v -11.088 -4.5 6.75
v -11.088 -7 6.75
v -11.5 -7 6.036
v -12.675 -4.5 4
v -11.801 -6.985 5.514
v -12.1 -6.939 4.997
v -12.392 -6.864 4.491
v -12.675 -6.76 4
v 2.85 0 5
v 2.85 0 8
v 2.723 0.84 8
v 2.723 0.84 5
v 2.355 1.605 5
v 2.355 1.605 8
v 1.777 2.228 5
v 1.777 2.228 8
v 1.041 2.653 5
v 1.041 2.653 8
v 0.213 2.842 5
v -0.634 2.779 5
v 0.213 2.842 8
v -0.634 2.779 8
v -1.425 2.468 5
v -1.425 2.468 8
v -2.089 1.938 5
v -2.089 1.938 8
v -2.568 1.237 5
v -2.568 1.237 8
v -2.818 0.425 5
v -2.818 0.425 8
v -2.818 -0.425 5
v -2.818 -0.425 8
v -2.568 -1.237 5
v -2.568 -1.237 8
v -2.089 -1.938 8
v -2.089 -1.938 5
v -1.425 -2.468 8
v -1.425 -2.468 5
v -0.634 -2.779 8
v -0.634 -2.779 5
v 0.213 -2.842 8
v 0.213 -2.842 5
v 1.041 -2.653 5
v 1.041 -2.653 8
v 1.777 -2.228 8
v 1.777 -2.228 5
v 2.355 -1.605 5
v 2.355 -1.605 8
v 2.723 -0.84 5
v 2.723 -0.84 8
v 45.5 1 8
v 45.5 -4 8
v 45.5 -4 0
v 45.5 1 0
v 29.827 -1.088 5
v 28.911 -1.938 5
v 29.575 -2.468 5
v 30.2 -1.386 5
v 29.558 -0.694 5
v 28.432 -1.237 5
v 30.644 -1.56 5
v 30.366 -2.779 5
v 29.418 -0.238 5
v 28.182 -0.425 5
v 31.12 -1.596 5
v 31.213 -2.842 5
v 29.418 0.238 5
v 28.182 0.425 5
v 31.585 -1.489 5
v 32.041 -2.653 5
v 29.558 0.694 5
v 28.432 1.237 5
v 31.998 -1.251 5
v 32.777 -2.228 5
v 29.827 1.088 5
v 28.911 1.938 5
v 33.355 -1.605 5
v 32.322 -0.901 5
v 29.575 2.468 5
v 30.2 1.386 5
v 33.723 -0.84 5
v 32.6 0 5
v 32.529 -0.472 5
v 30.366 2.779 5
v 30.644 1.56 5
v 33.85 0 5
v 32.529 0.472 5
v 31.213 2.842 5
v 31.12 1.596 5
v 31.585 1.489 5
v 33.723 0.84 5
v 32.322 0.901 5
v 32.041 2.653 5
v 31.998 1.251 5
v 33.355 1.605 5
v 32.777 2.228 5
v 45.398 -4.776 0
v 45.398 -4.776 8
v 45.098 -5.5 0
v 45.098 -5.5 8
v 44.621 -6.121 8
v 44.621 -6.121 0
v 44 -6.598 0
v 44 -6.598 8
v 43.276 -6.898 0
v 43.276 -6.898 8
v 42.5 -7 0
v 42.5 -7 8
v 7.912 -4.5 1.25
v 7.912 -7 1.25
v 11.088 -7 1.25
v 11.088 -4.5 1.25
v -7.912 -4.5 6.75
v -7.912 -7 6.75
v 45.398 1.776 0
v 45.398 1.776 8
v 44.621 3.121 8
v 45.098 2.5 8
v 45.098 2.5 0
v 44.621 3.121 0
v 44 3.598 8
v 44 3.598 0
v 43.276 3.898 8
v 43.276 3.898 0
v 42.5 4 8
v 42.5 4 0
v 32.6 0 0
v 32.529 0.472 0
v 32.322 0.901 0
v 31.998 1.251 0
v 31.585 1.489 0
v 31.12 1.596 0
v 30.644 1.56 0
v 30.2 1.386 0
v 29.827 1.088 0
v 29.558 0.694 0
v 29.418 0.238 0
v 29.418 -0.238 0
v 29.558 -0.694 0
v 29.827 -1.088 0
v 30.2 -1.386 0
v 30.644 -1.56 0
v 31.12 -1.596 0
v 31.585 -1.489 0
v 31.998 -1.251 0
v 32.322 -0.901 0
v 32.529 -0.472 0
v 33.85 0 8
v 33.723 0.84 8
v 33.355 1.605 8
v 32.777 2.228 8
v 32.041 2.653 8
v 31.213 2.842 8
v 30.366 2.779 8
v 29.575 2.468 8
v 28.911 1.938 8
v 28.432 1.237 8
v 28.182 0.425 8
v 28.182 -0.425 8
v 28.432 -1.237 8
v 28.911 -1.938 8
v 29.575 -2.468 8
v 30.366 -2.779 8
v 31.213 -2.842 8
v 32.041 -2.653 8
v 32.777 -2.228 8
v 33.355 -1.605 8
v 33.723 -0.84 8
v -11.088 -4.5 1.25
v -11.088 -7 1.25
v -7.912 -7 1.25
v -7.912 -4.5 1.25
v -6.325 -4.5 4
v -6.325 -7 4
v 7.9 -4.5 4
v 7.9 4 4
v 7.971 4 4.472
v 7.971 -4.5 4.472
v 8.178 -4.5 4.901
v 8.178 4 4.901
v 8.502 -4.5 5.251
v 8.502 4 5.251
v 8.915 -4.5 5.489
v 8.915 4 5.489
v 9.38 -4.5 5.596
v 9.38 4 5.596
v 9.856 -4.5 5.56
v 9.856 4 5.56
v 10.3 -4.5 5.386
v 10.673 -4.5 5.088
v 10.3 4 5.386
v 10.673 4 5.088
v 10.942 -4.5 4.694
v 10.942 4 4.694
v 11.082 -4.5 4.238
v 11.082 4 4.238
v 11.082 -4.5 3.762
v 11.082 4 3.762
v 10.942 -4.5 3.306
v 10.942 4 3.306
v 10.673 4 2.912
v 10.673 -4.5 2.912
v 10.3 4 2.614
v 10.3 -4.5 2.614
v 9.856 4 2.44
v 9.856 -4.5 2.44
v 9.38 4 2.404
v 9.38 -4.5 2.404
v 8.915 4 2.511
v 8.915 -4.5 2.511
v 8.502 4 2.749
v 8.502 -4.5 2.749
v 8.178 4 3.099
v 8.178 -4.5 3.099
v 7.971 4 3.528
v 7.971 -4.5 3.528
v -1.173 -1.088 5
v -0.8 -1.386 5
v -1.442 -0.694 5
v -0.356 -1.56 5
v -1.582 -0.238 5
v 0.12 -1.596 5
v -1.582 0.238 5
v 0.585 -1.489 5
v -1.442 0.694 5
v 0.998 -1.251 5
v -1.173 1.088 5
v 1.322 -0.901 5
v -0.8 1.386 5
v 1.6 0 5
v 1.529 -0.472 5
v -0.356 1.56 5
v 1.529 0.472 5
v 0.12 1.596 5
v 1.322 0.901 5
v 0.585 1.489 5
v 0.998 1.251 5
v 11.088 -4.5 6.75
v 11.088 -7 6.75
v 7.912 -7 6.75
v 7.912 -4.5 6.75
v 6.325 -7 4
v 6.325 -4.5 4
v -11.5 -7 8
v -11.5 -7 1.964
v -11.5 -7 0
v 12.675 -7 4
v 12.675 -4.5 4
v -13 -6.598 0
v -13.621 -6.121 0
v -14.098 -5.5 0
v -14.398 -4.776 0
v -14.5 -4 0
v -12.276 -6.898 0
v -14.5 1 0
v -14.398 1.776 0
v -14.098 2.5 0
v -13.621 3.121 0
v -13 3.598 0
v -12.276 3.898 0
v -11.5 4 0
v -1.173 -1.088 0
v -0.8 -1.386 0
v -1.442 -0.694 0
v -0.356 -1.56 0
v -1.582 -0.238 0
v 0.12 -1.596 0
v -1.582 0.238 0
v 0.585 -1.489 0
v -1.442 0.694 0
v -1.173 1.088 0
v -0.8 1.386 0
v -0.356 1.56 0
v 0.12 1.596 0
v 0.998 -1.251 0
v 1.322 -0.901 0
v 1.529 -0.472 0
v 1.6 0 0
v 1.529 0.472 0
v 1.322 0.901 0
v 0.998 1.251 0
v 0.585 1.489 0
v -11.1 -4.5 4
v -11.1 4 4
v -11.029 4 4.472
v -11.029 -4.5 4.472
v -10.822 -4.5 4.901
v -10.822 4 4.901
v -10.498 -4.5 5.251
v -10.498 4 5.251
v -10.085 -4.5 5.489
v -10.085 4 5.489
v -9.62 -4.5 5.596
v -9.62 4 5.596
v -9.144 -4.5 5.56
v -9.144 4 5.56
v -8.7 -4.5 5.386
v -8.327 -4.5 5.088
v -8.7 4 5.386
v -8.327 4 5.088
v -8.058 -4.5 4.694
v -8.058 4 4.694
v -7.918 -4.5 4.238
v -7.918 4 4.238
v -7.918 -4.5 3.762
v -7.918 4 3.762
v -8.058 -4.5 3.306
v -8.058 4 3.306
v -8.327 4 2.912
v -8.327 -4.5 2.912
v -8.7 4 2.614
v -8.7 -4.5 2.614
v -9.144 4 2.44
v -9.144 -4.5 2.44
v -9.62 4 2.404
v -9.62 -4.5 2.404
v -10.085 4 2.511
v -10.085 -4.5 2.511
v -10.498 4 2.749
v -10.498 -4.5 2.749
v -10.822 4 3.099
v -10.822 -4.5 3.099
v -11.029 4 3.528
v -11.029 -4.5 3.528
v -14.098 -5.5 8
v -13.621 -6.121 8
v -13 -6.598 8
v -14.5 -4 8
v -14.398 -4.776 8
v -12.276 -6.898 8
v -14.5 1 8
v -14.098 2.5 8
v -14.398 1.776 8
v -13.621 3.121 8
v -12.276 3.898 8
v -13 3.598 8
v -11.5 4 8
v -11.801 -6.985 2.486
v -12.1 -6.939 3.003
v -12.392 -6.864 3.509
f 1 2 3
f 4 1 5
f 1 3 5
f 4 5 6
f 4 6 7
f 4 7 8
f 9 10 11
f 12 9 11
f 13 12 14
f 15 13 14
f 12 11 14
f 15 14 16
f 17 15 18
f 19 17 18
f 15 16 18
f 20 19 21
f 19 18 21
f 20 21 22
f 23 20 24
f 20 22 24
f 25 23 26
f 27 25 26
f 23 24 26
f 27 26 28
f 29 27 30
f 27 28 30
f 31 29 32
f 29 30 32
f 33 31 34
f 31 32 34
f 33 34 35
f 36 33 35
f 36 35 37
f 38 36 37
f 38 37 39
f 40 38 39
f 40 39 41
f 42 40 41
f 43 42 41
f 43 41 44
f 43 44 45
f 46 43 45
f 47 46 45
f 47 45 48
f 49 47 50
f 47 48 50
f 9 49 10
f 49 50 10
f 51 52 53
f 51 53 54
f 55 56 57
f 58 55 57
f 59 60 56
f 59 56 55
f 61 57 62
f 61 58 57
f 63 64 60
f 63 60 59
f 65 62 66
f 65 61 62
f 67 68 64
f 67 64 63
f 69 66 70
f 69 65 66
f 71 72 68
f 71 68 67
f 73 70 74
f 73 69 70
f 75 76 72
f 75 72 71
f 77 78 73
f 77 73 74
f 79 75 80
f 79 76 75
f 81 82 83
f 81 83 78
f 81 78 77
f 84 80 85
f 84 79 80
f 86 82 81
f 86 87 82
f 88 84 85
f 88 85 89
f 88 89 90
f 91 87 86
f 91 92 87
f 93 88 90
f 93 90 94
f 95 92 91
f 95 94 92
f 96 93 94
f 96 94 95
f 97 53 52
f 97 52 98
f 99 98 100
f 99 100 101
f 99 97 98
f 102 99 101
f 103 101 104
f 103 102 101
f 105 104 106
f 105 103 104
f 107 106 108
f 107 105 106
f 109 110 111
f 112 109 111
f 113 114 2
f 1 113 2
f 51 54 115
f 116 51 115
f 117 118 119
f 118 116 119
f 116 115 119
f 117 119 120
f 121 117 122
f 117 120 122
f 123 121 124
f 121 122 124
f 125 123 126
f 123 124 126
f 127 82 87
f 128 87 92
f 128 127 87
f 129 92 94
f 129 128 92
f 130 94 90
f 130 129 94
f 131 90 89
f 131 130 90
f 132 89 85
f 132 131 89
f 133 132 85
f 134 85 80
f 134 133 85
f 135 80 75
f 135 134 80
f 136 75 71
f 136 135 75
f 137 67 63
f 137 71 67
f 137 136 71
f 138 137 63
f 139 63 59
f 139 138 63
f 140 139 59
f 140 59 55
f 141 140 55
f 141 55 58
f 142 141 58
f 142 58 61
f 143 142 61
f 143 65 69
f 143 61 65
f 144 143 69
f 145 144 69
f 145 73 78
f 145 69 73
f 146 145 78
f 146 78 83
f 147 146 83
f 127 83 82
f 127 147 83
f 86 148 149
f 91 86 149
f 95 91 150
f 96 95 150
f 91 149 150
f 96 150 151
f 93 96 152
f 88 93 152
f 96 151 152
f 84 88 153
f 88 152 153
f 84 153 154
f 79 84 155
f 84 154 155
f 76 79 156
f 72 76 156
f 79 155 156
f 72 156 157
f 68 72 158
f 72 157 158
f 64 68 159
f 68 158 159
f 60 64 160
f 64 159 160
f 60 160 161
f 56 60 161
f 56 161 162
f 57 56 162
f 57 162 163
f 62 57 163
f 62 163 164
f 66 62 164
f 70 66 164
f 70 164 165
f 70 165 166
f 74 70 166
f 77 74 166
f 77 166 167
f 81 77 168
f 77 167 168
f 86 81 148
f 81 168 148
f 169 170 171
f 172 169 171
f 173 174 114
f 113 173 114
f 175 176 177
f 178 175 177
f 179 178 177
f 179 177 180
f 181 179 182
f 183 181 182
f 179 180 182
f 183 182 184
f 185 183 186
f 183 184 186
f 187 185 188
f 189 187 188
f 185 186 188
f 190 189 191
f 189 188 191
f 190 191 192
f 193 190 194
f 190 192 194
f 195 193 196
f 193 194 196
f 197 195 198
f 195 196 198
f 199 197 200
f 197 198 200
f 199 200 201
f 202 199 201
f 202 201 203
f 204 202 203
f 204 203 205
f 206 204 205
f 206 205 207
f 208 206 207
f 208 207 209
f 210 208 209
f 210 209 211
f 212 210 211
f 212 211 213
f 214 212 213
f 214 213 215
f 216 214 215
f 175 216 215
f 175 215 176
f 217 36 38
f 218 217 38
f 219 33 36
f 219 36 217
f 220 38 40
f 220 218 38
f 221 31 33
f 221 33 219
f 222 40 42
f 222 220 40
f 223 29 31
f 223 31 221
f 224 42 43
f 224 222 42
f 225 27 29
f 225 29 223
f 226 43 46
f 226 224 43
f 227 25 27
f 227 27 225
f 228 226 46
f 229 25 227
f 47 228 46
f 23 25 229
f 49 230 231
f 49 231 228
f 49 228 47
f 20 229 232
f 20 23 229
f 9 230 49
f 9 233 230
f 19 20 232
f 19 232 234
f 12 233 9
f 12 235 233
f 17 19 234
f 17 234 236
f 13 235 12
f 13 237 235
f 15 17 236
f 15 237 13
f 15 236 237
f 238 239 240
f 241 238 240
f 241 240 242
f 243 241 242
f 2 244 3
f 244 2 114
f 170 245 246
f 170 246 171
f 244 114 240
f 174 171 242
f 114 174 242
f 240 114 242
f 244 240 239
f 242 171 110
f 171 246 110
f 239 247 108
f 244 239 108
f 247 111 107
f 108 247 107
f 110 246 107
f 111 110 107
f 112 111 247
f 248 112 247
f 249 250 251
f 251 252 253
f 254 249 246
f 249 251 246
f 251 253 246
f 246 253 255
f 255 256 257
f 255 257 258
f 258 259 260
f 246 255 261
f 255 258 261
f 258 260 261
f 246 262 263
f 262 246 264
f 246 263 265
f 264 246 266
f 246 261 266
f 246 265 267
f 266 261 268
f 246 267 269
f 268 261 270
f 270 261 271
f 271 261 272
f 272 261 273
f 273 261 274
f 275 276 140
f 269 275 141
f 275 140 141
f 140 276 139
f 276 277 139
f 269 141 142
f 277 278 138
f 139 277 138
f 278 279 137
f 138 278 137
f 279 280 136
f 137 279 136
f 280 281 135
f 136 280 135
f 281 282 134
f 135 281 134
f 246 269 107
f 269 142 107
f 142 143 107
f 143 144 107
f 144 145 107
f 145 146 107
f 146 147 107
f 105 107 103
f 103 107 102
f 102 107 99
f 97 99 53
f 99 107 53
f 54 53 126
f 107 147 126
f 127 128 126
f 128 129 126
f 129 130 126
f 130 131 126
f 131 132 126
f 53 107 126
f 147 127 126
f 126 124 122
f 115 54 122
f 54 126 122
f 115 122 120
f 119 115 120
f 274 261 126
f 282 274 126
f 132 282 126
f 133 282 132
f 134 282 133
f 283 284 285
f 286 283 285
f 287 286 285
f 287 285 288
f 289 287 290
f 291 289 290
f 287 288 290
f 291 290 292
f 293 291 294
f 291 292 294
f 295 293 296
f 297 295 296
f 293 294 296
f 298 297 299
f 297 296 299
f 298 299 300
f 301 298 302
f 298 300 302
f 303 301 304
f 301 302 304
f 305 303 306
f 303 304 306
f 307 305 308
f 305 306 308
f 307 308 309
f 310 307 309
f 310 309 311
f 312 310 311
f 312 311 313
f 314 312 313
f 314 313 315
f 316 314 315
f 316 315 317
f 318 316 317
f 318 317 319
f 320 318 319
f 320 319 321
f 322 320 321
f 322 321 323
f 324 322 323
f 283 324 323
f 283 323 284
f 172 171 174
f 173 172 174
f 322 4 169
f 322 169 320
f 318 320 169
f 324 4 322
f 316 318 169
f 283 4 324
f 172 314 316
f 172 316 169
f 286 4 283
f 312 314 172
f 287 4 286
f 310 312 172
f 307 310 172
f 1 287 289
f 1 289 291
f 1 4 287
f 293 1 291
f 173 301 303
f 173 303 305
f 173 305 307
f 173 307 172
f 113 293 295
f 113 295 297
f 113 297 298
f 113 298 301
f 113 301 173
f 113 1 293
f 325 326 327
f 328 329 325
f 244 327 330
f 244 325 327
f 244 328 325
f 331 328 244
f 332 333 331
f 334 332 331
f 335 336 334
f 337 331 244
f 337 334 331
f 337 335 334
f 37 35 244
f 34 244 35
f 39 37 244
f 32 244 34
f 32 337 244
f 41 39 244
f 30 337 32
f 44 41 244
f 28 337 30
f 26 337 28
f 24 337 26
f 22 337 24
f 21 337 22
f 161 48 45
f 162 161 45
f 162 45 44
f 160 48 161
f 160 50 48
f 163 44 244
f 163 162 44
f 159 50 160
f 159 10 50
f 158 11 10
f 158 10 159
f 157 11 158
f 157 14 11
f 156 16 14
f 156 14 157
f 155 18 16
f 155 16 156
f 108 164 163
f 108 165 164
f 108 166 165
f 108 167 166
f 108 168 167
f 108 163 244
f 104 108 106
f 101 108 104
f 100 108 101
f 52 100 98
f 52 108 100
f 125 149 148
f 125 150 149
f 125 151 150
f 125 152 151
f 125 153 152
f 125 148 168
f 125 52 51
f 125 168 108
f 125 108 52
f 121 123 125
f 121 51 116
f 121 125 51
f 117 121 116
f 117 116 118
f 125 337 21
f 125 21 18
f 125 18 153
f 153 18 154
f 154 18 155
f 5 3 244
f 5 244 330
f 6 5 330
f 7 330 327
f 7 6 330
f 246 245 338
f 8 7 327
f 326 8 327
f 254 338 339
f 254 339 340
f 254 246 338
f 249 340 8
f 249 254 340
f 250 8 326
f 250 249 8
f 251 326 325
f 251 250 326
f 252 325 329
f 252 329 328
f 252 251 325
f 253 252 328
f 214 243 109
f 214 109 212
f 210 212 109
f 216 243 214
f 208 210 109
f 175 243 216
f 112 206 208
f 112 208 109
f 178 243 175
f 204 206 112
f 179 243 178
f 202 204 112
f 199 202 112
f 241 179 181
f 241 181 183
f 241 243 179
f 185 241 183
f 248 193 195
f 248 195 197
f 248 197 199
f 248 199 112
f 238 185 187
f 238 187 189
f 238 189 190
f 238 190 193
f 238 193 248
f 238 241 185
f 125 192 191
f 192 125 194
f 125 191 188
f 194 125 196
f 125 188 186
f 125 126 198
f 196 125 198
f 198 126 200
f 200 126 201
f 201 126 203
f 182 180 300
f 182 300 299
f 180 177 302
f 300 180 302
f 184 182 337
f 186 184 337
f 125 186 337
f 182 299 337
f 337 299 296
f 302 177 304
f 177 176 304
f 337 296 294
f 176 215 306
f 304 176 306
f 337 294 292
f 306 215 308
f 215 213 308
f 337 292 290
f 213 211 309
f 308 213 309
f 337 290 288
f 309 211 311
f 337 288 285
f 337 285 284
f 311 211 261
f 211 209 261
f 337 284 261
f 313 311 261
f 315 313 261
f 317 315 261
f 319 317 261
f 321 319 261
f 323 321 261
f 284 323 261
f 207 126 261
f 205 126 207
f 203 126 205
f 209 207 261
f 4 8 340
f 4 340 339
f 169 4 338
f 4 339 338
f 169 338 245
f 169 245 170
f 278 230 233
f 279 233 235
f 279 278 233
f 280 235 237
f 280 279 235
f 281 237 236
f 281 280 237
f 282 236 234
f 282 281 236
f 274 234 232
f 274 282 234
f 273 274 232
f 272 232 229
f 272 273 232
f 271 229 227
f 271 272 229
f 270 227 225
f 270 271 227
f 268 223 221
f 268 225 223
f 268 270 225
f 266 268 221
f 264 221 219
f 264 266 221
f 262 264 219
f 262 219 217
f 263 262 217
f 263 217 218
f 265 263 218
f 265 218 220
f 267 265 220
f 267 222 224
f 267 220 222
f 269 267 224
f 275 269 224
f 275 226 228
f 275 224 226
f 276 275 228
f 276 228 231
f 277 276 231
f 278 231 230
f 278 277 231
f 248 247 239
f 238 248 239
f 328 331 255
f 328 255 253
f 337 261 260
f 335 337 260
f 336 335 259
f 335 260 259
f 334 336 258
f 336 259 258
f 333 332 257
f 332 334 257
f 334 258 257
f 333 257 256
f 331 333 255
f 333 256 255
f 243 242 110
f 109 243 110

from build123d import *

# Parameters (mm, degrees)
F1_R        = 1.6
F2_DEPTH    = 8
F3_R        = 2.85
F4_DEPTH    = 3
F6_DEPTH    = 2.5
F7_D        = 3.2
F8_T1_DEPTH = 23


# Not quite as in the source:
# - a fillet or chamfer that OpenCascade refuses, or shapes differently, is made with other operations: its cross-section is extruded or revolved along the edge and cut away or added


with BuildPart() as f2:
    # F1 (on Top) → F2 (new body)
    with BuildSketch(Plane.XY):
        Polygon((45.5, -7), (45.5, 0), (45.5, 4), (-14.5, 4), (-14.5, 0), (-14.5, -0.2), (-14.5, -7), (-9.5, -7), (40.5, -7), align=None)
        Circle(F1_R, mode=Mode.SUBTRACT)
        with Locations((31, 0)):
            Circle(F1_R, mode=Mode.SUBTRACT)
    extrude(amount=F2_DEPTH)

    # F3 (on face) → F4 (cut)
    with BuildSketch(Plane.XY.offset(8)):
        Circle(F3_R)
        with Locations((31, 0)):
            Circle(F3_R)
    extrude(amount=-F4_DEPTH, mode=Mode.SUBTRACT)

    # F5 (on face) → F6 (cut)
    with BuildSketch(Plane.XZ.offset(7)):
        Polygon((-7.9122867597, 6.75), (-11.0877132403, 6.75), (-12.6754264805, 4), (-11.0877132403, 1.25), (-7.9122867597, 1.25), (-6.3245735195, 4), align=None)
        Polygon((11.0877132403, 6.75), (7.9122867597, 6.75), (6.3245735195, 4), (7.9122867597, 1.25), (11.0877132403, 1.25), (12.6754264805, 4), align=None)
    extrude(amount=-F6_DEPTH, mode=Mode.SUBTRACT)

    # F7 (through all)
    with Locations(Plane.XZ.offset(7)):
        with Locations((-9.5, 4), (9.5, 4)):
            Hole(F7_D / 2)

    # F8: fillet of radius 3 on 4 edges, made by hand

    # F8_s2 → F8_t1 (cut)
    with BuildSketch(Plane.XY.offset(-7.5)):
        with BuildLine():
            ThreePointArc((-11.5, 4), (-13.6213203436, 3.1213203436), (-14.5, 1))
            Line((-14.5, 1), (-14.5, 4))
            Line((-14.5, 4), (-11.5, 4))
        make_face()
        with BuildLine():
            ThreePointArc((45.5, -4), (44.6213203436, -6.1213203436), (42.5, -7))
            Line((42.5, -7), (45.5, -7))
            Line((45.5, -7), (45.5, -4))
        make_face()
        with BuildLine():
            ThreePointArc((45.5, 1), (44.6213203436, 3.1213203436), (42.5, 4))
            Line((42.5, 4), (45.5, 4))
            Line((45.5, 4), (45.5, 1))
        make_face()
        with BuildLine():
            ThreePointArc((-11.5, -7), (-13.6213203436, -6.1213203436), (-14.5, -4))
            Line((-14.5, -4), (-14.5, -7))
            Line((-14.5, -7), (-11.5, -7))
        make_face()
    extrude(amount=F8_T1_DEPTH, mode=Mode.SUBTRACT)


solid = f2.part
